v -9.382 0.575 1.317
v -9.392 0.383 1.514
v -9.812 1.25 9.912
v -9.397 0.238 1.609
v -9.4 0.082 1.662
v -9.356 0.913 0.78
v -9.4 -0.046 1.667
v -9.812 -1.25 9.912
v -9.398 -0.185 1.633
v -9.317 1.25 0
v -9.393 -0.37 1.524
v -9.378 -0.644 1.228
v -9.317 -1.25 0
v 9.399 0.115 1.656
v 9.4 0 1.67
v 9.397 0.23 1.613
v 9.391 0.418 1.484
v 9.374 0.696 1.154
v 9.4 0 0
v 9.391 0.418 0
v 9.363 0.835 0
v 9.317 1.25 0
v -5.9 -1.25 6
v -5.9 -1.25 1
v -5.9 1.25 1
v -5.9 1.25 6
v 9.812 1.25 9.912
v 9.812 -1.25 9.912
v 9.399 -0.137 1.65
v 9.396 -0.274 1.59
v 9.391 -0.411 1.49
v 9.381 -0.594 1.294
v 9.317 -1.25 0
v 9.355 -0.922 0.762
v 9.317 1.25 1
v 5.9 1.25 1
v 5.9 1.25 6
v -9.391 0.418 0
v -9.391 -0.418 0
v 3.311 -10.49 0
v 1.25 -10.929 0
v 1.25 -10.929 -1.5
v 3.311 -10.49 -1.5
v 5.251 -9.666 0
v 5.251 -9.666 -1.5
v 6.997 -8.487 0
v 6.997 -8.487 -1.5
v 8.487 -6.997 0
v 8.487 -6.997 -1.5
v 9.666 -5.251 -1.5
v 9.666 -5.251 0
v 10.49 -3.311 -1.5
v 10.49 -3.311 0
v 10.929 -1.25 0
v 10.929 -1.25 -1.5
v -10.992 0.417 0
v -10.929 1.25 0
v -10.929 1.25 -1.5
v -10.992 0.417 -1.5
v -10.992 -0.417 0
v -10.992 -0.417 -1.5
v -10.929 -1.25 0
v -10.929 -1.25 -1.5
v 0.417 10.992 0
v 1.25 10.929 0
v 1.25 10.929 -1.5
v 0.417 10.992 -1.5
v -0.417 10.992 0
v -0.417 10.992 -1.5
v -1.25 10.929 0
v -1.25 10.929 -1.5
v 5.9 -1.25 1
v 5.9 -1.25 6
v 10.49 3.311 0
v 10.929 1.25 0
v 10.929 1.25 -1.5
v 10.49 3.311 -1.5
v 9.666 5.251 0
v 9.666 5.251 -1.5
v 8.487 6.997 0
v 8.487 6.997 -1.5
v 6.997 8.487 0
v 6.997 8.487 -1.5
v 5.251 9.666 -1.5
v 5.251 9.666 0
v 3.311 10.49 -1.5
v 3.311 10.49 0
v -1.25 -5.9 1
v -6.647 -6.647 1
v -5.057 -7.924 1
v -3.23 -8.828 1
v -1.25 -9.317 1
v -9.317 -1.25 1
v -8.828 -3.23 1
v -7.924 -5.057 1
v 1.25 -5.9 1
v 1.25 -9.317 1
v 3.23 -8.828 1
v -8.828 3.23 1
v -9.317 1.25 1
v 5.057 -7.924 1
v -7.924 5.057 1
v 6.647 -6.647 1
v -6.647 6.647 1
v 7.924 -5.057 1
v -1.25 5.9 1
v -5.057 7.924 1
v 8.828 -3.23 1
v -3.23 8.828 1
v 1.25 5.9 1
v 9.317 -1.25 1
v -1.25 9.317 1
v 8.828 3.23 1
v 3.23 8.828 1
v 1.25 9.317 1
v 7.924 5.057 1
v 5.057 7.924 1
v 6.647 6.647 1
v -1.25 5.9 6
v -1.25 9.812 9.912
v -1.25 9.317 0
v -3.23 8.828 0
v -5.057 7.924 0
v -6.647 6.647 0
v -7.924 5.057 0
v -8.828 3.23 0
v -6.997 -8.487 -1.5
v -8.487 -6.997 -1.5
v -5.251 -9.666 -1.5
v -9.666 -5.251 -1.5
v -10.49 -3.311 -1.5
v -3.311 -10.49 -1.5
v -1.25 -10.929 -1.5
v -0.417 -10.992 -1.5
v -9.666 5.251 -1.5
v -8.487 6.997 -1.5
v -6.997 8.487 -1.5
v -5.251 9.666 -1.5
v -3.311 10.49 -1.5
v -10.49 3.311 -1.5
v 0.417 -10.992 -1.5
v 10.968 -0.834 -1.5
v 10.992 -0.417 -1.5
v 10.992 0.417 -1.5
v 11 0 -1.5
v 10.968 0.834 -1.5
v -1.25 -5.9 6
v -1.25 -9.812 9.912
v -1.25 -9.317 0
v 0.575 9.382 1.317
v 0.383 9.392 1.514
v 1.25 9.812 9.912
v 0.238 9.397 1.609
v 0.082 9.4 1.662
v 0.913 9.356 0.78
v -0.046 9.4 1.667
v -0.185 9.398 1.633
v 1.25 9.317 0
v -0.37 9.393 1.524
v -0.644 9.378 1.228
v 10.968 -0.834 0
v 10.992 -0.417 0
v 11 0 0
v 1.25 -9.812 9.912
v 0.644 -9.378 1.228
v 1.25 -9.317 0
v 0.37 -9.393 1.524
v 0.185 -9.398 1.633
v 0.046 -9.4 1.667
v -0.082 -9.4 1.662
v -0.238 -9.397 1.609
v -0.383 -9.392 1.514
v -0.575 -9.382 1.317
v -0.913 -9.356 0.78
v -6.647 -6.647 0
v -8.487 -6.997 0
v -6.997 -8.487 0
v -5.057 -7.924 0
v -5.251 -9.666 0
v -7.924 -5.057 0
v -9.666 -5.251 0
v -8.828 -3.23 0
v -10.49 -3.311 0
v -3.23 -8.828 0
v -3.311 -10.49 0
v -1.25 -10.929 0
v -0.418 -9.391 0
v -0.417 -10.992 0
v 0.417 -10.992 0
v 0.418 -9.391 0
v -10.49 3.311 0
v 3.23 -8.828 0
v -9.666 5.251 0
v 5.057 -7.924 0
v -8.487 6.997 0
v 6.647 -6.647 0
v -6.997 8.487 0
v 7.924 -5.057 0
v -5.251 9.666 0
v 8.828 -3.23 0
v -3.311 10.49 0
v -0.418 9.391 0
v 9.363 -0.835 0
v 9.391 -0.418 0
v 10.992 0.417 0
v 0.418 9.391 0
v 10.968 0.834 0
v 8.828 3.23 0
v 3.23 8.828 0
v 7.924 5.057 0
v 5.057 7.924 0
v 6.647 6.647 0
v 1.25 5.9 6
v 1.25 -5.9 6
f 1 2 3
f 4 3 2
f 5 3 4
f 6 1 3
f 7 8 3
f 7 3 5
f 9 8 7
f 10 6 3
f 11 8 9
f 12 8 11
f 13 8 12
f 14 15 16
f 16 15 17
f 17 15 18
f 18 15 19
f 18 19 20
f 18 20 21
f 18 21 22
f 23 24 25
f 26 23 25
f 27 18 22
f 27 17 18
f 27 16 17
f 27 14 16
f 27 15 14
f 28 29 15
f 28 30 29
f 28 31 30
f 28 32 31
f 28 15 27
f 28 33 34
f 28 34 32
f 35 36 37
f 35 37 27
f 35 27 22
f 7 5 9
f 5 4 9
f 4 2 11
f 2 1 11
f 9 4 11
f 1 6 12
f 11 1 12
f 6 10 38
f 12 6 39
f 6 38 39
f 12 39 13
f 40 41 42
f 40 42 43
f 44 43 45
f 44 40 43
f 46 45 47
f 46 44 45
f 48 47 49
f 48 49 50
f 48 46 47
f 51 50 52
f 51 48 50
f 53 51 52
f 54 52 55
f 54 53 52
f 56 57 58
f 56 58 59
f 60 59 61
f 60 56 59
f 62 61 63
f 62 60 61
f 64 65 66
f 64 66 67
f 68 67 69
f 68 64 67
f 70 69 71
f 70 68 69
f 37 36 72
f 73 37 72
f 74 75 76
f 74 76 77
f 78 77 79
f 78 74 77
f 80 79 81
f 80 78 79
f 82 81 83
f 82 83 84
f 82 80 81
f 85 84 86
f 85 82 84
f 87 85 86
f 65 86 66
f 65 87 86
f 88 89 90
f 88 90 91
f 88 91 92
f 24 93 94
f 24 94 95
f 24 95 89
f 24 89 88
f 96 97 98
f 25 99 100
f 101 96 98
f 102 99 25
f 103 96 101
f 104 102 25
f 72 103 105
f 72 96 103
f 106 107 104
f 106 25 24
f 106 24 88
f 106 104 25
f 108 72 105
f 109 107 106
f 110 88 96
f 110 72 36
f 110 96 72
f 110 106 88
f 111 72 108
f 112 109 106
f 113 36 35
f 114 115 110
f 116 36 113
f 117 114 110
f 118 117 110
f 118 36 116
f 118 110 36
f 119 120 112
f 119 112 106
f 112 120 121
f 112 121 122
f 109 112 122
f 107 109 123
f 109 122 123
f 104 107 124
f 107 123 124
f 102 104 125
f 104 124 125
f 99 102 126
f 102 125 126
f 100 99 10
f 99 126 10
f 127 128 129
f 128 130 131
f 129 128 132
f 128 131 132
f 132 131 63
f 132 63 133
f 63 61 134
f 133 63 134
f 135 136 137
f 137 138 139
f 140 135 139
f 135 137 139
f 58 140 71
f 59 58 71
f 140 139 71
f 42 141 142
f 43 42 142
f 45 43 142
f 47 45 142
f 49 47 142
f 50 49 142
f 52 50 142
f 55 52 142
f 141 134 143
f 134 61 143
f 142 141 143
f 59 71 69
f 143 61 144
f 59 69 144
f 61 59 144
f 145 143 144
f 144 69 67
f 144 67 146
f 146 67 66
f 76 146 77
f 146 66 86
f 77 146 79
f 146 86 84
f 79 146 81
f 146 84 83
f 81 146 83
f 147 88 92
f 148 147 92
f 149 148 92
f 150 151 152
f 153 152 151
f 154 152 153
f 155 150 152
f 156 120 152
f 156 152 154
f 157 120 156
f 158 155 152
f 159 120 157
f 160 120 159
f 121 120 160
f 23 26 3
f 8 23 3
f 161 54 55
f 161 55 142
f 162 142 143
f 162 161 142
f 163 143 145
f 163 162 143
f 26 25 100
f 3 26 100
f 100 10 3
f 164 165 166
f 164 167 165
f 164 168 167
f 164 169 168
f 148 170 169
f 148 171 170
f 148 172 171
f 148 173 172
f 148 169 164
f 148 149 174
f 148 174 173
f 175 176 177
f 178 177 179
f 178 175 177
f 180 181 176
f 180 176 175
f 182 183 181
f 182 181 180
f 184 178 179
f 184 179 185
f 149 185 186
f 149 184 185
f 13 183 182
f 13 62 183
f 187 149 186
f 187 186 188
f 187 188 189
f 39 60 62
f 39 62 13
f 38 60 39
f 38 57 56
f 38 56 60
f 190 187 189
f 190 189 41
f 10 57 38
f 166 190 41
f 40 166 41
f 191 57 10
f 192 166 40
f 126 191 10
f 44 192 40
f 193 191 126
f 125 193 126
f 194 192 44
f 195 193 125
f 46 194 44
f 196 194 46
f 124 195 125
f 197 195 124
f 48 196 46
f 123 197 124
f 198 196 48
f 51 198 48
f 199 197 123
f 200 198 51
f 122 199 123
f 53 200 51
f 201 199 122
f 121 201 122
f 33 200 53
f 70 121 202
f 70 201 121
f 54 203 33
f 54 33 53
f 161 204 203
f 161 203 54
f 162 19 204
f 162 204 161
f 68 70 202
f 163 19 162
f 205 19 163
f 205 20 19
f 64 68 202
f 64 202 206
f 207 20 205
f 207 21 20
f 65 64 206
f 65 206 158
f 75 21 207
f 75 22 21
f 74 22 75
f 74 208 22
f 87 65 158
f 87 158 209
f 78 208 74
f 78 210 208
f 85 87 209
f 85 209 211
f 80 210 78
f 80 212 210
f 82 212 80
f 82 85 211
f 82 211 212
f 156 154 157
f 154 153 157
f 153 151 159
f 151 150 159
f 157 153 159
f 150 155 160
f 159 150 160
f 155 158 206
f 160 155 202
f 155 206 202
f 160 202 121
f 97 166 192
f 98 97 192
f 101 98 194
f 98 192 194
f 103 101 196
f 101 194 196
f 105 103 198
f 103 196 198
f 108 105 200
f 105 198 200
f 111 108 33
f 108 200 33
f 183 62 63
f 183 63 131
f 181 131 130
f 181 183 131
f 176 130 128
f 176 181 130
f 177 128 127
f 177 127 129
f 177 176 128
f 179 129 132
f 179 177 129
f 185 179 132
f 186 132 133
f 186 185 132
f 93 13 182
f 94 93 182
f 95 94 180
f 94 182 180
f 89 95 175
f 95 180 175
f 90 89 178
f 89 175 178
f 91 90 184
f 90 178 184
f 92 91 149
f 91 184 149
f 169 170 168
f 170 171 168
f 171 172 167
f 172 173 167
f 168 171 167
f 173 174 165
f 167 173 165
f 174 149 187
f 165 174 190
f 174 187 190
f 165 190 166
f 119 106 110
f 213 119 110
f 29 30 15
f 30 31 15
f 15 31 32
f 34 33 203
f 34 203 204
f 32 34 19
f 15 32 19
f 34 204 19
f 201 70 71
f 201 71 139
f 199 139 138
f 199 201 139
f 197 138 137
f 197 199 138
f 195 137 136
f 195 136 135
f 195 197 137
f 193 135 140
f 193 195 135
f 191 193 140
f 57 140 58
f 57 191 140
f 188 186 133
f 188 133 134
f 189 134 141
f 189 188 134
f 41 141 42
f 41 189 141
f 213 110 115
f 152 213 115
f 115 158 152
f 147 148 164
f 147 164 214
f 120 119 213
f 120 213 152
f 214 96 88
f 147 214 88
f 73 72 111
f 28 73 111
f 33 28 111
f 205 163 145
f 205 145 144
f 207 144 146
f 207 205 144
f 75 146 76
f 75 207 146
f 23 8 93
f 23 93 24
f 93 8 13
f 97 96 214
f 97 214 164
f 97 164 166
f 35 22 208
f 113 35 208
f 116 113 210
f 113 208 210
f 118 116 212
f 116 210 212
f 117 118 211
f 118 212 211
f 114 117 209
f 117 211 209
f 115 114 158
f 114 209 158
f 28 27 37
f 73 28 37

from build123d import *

# Parameters (mm, degrees)
F1_DEPTH     = 1.5
F2_DEPTH     = 10
F4_DEPTH     = 2.5
F6_DEPTH     = 2.5
F8_DEPTH     = 2.5
F10_DEPTH    = 2.5
F11_DEPTH    = 1
F12_T1_DEPTH = 23.0734639037
F12_T3_DEPTH = 23.0734639037


# Not quite as in the source:
# - a fillet or chamfer that OpenCascade refuses, or shapes differently, is made with other operations: its cross-section is extruded or revolved along the edge and cut away or added


with BuildPart() as f1:
    # F0 (on Top) → F1 (new body)
    with BuildSketch(Plane.XY):
        with BuildLine():
            Line((-1.25, 9.3165175897), (-1.25, 10.9287464972))
            ThreePointArc((-1.25, 10.9287464972), (-7.7781745931, 7.7781745931), (-10.9287464972, 1.25))
            Line((-10.9287464972, 1.25), (-9.3165175897, 1.25))
            ThreePointArc((-9.3165175897, 1.25), (-6.6468037432, 6.6468037432), (-1.25, 9.3165175897))
        make_face()
        with BuildLine():
            ThreePointArc((-10.9287464972, -1.25), (-7.7781745931, -7.7781745931), (-1.25, -10.9287464972))
            Line((-1.25, -10.9287464972), (-1.25, -9.3165175897))
            ThreePointArc((-1.25, -9.3165175897), (-6.6468037432, -6.6468037432), (-9.3165175897, -1.25))
            Line((-9.3165175897, -1.25), (-10.9287464972, -1.25))
        make_face()
        with BuildLine():
            Line((-9.3165175897, 1.25), (-10.9287464972, 1.25))
            ThreePointArc((-10.9287464972, 1.25), (-11, 0), (-10.9287464972, -1.25))
            Line((-10.9287464972, -1.25), (-9.3165175897, -1.25))
            ThreePointArc((-9.3165175897, -1.25), (-9.4, 0), (-9.3165175897, 1.25))
        make_face()
        with BuildLine():
            ThreePointArc((1.25, -10.9287464972), (7.7781745931, -7.7781745931), (10.9287464972, -1.25))
            Line((10.9287464972, -1.25), (9.3165175897, -1.25))
            ThreePointArc((9.3165175897, -1.25), (6.6468037432, -6.6468037432), (1.25, -9.3165175897))
            Line((1.25, -9.3165175897), (1.25, -10.9287464972))
        make_face()
        with BuildLine():
            ThreePointArc((-1.25, -10.9287464972), (0, -11), (1.25, -10.9287464972))
            Line((1.25, -10.9287464972), (1.25, -9.3165175897))
            ThreePointArc((1.25, -9.3165175897), (0, -9.4), (-1.25, -9.3165175897))
            Line((-1.25, -9.3165175897), (-1.25, -10.9287464972))
        make_face()
        with BuildLine():
            Line((9.3165175897, 1.25), (10.9287464972, 1.25))
            ThreePointArc((10.9287464972, 1.25), (7.7781745931, 7.7781745931), (1.25, 10.9287464972))
            Line((1.25, 10.9287464972), (1.25, 9.3165175897))
            ThreePointArc((1.25, 9.3165175897), (6.6468037432, 6.6468037432), (9.3165175897, 1.25))
        make_face()
        with BuildLine():
            ThreePointArc((10.9287464972, -1.25), (10.9821721774, -0.6260145888), (11, 0))
            ThreePointArc((11, 0), (10.9821721774, 0.6260145888), (10.9287464972, 1.25))
            Line((10.9287464972, 1.25), (9.3165175897, 1.25))
            ThreePointArc((9.3165175897, 1.25), (9.3791061766, 0.6263923117), (9.4, 0))
            ThreePointArc((9.4, 0), (9.3791061766, -0.6263923117), (9.3165175897, -1.25))
            Line((9.3165175897, -1.25), (10.9287464972, -1.25))
        make_face()
        with BuildLine():
            Line((1.25, 9.3165175897), (1.25, 10.9287464972))
            ThreePointArc((1.25, 10.9287464972), (0, 11), (-1.25, 10.9287464972))
            Line((-1.25, 10.9287464972), (-1.25, 9.3165175897))
            ThreePointArc((-1.25, 9.3165175897), (0, 9.4), (1.25, 9.3165175897))
        make_face()
        with BuildLine():
            Line((5.9, 1.25), (9.3165175897, 1.25))
            ThreePointArc((9.3165175897, 1.25), (6.6468037432, 6.6468037432), (1.25, 9.3165175897))
            Line((1.25, 9.3165175897), (1.25, 5.9))
            Line((1.25, 5.9), (-1.25, 5.9))
            Line((-1.25, 5.9), (-1.25, 9.3165175897))
            ThreePointArc((-1.25, 9.3165175897), (-6.6468037432, 6.6468037432), (-9.3165175897, 1.25))
            Line((-9.3165175897, 1.25), (-5.9, 1.25))
            Line((-5.9, 1.25), (-5.9, -1.25))
            Line((-5.9, -1.25), (-9.3165175897, -1.25))
            ThreePointArc((-9.3165175897, -1.25), (-6.6468037432, -6.6468037432), (-1.25, -9.3165175897))
            Line((-1.25, -9.3165175897), (-1.25, -5.9))
            Line((-1.25, -5.9), (1.25, -5.9))
            Line((1.25, -5.9), (1.25, -9.3165175897))
            ThreePointArc((1.25, -9.3165175897), (6.6468037432, -6.6468037432), (9.3165175897, -1.25))
            Line((9.3165175897, -1.25), (5.9, -1.25))
            Line((5.9, -1.25), (5.9, 1.25))
        make_face()
        with BuildLine():
            Line((1.25, 5.9), (1.25, 9.3165175897))
            ThreePointArc((1.25, 9.3165175897), (0, 9.4), (-1.25, 9.3165175897))
            Line((-1.25, 9.3165175897), (-1.25, 5.9))
            Line((-1.25, 5.9), (1.25, 5.9))
        make_face()
        with BuildLine():
            ThreePointArc((9.4, 0), (9.3791061766, 0.6263923117), (9.3165175897, 1.25))
            Line((9.3165175897, 1.25), (5.9, 1.25))
            Line((5.9, 1.25), (5.9, -1.25))
            Line((5.9, -1.25), (9.3165175897, -1.25))
            ThreePointArc((9.3165175897, -1.25), (9.3791061766, -0.6263923117), (9.4, 0))
        make_face()
        with BuildLine():
            Line((-5.9, 1.25), (-9.3165175897, 1.25))
            ThreePointArc((-9.3165175897, 1.25), (-9.4, 0), (-9.3165175897, -1.25))
            Line((-9.3165175897, -1.25), (-5.9, -1.25))
            Line((-5.9, -1.25), (-5.9, 1.25))
        make_face()
        with BuildLine():
            ThreePointArc((-1.25, -9.3165175897), (0, -9.4), (1.25, -9.3165175897))
            Line((1.25, -9.3165175897), (1.25, -5.9))
            Line((1.25, -5.9), (-1.25, -5.9))
            Line((-1.25, -5.9), (-1.25, -9.3165175897))
        make_face()
    extrude(amount=-F1_DEPTH)

    # F0 (on Top) → F2 (join)
    with BuildSketch(Plane.XY):
        with BuildLine():
            Line((1.25, 5.9), (1.25, 9.3165175897))
            ThreePointArc((1.25, 9.3165175897), (0, 9.4), (-1.25, 9.3165175897))
            Line((-1.25, 9.3165175897), (-1.25, 5.9))
            Line((-1.25, 5.9), (1.25, 5.9))
        make_face()
        with BuildLine():
            ThreePointArc((9.4, 0), (9.3791061766, 0.6263923117), (9.3165175897, 1.25))
            Line((9.3165175897, 1.25), (5.9, 1.25))
            Line((5.9, 1.25), (5.9, -1.25))
            Line((5.9, -1.25), (9.3165175897, -1.25))
            ThreePointArc((9.3165175897, -1.25), (9.3791061766, -0.6263923117), (9.4, 0))
        make_face()
        with BuildLine():
            Line((-5.9, 1.25), (-9.3165175897, 1.25))
            ThreePointArc((-9.3165175897, 1.25), (-9.4, 0), (-9.3165175897, -1.25))
            Line((-9.3165175897, -1.25), (-5.9, -1.25))
            Line((-5.9, -1.25), (-5.9, 1.25))
        make_face()
        with BuildLine():
            ThreePointArc((-1.25, -9.3165175897), (0, -9.4), (1.25, -9.3165175897))
            Line((1.25, -9.3165175897), (1.25, -5.9))
            Line((1.25, -5.9), (-1.25, -5.9))
            Line((-1.25, -5.9), (-1.25, -9.3165175897))
        make_face()
    extrude(amount=F2_DEPTH)

    # F3 (on face) → F4 (join)
    with BuildSketch(Plane(origin=(-1.25, 0, 0), x_dir=(0, -1, 0), z_dir=(-1, 0, 0))):
        Polygon((-9.3165175897, 0), (-9.3165175897, 10), (-9.8165175897, 10), align=None)
    extrude(amount=-F4_DEPTH)

    # F5 (on face) → F6 (join)
    with BuildSketch(Plane(origin=(-1.25, 0, 0), x_dir=(0, -1, 0), z_dir=(-1, 0, 0))):
        Polygon((9.8165175897, 10), (9.3165175897, 10), (9.3165175897, 0), align=None)
    extrude(amount=-F6_DEPTH)

    # F7 (on face) → F8 (join)
    with BuildSketch(Plane.XZ.offset(1.25)):
        Polygon((-9.3165175897, 0), (-9.3165175897, 10), (-9.8165175897, 10), align=None)
    extrude(amount=-F8_DEPTH)

    # F9 (on face) → F10 (join)
    with BuildSketch(Plane.XZ.offset(1.25)):
        Polygon((9.8165175897, 10), (9.3165175897, 10), (9.3165175897, 0), align=None)
    extrude(amount=-F10_DEPTH)

    # F0 (on Top) → F11 (join)
    with BuildSketch(Plane.XY):
        with BuildLine():
            Line((5.9, 1.25), (9.3165175897, 1.25))
            ThreePointArc((9.3165175897, 1.25), (6.6468037432, 6.6468037432), (1.25, 9.3165175897))
            Line((1.25, 9.3165175897), (1.25, 5.9))
            Line((1.25, 5.9), (-1.25, 5.9))
            Line((-1.25, 5.9), (-1.25, 9.3165175897))
            ThreePointArc((-1.25, 9.3165175897), (-6.6468037432, 6.6468037432), (-9.3165175897, 1.25))
            Line((-9.3165175897, 1.25), (-5.9, 1.25))
            Line((-5.9, 1.25), (-5.9, -1.25))
            Line((-5.9, -1.25), (-9.3165175897, -1.25))
            ThreePointArc((-9.3165175897, -1.25), (-6.6468037432, -6.6468037432), (-1.25, -9.3165175897))
            Line((-1.25, -9.3165175897), (-1.25, -5.9))
            Line((-1.25, -5.9), (1.25, -5.9))
            Line((1.25, -5.9), (1.25, -9.3165175897))
            ThreePointArc((1.25, -9.3165175897), (6.6468037432, -6.6468037432), (9.3165175897, -1.25))
            Line((9.3165175897, -1.25), (5.9, -1.25))
            Line((5.9, -1.25), (5.9, 1.25))
        make_face()
    extrude(amount=F11_DEPTH)

    # F12: chamfer of 4 on 4 edges, made by hand

    # F12_s2 → F12_t1 (cut)
    with BuildSketch(Plane.YZ.offset(-11.5367319519)):
        Polygon((5.9, 6), (9.9, 10), (5.9, 10), align=None)
        Polygon((-9.9, 10), (-5.9, 6), (-5.9, 10), align=None)
    extrude(amount=F12_T1_DEPTH, mode=Mode.SUBTRACT)

    # F12_s4 → F12_t3 (cut)
    with BuildSketch(Plane.XZ.offset(-11.5367319519)):
        Polygon((9.9, 10), (5.9, 6), (5.9, 10), align=None)
        Polygon((-5.9, 6), (-9.9, 10), (-5.9, 10), align=None)
    extrude(amount=F12_T3_DEPTH, mode=Mode.SUBTRACT)


solid = f1.part
